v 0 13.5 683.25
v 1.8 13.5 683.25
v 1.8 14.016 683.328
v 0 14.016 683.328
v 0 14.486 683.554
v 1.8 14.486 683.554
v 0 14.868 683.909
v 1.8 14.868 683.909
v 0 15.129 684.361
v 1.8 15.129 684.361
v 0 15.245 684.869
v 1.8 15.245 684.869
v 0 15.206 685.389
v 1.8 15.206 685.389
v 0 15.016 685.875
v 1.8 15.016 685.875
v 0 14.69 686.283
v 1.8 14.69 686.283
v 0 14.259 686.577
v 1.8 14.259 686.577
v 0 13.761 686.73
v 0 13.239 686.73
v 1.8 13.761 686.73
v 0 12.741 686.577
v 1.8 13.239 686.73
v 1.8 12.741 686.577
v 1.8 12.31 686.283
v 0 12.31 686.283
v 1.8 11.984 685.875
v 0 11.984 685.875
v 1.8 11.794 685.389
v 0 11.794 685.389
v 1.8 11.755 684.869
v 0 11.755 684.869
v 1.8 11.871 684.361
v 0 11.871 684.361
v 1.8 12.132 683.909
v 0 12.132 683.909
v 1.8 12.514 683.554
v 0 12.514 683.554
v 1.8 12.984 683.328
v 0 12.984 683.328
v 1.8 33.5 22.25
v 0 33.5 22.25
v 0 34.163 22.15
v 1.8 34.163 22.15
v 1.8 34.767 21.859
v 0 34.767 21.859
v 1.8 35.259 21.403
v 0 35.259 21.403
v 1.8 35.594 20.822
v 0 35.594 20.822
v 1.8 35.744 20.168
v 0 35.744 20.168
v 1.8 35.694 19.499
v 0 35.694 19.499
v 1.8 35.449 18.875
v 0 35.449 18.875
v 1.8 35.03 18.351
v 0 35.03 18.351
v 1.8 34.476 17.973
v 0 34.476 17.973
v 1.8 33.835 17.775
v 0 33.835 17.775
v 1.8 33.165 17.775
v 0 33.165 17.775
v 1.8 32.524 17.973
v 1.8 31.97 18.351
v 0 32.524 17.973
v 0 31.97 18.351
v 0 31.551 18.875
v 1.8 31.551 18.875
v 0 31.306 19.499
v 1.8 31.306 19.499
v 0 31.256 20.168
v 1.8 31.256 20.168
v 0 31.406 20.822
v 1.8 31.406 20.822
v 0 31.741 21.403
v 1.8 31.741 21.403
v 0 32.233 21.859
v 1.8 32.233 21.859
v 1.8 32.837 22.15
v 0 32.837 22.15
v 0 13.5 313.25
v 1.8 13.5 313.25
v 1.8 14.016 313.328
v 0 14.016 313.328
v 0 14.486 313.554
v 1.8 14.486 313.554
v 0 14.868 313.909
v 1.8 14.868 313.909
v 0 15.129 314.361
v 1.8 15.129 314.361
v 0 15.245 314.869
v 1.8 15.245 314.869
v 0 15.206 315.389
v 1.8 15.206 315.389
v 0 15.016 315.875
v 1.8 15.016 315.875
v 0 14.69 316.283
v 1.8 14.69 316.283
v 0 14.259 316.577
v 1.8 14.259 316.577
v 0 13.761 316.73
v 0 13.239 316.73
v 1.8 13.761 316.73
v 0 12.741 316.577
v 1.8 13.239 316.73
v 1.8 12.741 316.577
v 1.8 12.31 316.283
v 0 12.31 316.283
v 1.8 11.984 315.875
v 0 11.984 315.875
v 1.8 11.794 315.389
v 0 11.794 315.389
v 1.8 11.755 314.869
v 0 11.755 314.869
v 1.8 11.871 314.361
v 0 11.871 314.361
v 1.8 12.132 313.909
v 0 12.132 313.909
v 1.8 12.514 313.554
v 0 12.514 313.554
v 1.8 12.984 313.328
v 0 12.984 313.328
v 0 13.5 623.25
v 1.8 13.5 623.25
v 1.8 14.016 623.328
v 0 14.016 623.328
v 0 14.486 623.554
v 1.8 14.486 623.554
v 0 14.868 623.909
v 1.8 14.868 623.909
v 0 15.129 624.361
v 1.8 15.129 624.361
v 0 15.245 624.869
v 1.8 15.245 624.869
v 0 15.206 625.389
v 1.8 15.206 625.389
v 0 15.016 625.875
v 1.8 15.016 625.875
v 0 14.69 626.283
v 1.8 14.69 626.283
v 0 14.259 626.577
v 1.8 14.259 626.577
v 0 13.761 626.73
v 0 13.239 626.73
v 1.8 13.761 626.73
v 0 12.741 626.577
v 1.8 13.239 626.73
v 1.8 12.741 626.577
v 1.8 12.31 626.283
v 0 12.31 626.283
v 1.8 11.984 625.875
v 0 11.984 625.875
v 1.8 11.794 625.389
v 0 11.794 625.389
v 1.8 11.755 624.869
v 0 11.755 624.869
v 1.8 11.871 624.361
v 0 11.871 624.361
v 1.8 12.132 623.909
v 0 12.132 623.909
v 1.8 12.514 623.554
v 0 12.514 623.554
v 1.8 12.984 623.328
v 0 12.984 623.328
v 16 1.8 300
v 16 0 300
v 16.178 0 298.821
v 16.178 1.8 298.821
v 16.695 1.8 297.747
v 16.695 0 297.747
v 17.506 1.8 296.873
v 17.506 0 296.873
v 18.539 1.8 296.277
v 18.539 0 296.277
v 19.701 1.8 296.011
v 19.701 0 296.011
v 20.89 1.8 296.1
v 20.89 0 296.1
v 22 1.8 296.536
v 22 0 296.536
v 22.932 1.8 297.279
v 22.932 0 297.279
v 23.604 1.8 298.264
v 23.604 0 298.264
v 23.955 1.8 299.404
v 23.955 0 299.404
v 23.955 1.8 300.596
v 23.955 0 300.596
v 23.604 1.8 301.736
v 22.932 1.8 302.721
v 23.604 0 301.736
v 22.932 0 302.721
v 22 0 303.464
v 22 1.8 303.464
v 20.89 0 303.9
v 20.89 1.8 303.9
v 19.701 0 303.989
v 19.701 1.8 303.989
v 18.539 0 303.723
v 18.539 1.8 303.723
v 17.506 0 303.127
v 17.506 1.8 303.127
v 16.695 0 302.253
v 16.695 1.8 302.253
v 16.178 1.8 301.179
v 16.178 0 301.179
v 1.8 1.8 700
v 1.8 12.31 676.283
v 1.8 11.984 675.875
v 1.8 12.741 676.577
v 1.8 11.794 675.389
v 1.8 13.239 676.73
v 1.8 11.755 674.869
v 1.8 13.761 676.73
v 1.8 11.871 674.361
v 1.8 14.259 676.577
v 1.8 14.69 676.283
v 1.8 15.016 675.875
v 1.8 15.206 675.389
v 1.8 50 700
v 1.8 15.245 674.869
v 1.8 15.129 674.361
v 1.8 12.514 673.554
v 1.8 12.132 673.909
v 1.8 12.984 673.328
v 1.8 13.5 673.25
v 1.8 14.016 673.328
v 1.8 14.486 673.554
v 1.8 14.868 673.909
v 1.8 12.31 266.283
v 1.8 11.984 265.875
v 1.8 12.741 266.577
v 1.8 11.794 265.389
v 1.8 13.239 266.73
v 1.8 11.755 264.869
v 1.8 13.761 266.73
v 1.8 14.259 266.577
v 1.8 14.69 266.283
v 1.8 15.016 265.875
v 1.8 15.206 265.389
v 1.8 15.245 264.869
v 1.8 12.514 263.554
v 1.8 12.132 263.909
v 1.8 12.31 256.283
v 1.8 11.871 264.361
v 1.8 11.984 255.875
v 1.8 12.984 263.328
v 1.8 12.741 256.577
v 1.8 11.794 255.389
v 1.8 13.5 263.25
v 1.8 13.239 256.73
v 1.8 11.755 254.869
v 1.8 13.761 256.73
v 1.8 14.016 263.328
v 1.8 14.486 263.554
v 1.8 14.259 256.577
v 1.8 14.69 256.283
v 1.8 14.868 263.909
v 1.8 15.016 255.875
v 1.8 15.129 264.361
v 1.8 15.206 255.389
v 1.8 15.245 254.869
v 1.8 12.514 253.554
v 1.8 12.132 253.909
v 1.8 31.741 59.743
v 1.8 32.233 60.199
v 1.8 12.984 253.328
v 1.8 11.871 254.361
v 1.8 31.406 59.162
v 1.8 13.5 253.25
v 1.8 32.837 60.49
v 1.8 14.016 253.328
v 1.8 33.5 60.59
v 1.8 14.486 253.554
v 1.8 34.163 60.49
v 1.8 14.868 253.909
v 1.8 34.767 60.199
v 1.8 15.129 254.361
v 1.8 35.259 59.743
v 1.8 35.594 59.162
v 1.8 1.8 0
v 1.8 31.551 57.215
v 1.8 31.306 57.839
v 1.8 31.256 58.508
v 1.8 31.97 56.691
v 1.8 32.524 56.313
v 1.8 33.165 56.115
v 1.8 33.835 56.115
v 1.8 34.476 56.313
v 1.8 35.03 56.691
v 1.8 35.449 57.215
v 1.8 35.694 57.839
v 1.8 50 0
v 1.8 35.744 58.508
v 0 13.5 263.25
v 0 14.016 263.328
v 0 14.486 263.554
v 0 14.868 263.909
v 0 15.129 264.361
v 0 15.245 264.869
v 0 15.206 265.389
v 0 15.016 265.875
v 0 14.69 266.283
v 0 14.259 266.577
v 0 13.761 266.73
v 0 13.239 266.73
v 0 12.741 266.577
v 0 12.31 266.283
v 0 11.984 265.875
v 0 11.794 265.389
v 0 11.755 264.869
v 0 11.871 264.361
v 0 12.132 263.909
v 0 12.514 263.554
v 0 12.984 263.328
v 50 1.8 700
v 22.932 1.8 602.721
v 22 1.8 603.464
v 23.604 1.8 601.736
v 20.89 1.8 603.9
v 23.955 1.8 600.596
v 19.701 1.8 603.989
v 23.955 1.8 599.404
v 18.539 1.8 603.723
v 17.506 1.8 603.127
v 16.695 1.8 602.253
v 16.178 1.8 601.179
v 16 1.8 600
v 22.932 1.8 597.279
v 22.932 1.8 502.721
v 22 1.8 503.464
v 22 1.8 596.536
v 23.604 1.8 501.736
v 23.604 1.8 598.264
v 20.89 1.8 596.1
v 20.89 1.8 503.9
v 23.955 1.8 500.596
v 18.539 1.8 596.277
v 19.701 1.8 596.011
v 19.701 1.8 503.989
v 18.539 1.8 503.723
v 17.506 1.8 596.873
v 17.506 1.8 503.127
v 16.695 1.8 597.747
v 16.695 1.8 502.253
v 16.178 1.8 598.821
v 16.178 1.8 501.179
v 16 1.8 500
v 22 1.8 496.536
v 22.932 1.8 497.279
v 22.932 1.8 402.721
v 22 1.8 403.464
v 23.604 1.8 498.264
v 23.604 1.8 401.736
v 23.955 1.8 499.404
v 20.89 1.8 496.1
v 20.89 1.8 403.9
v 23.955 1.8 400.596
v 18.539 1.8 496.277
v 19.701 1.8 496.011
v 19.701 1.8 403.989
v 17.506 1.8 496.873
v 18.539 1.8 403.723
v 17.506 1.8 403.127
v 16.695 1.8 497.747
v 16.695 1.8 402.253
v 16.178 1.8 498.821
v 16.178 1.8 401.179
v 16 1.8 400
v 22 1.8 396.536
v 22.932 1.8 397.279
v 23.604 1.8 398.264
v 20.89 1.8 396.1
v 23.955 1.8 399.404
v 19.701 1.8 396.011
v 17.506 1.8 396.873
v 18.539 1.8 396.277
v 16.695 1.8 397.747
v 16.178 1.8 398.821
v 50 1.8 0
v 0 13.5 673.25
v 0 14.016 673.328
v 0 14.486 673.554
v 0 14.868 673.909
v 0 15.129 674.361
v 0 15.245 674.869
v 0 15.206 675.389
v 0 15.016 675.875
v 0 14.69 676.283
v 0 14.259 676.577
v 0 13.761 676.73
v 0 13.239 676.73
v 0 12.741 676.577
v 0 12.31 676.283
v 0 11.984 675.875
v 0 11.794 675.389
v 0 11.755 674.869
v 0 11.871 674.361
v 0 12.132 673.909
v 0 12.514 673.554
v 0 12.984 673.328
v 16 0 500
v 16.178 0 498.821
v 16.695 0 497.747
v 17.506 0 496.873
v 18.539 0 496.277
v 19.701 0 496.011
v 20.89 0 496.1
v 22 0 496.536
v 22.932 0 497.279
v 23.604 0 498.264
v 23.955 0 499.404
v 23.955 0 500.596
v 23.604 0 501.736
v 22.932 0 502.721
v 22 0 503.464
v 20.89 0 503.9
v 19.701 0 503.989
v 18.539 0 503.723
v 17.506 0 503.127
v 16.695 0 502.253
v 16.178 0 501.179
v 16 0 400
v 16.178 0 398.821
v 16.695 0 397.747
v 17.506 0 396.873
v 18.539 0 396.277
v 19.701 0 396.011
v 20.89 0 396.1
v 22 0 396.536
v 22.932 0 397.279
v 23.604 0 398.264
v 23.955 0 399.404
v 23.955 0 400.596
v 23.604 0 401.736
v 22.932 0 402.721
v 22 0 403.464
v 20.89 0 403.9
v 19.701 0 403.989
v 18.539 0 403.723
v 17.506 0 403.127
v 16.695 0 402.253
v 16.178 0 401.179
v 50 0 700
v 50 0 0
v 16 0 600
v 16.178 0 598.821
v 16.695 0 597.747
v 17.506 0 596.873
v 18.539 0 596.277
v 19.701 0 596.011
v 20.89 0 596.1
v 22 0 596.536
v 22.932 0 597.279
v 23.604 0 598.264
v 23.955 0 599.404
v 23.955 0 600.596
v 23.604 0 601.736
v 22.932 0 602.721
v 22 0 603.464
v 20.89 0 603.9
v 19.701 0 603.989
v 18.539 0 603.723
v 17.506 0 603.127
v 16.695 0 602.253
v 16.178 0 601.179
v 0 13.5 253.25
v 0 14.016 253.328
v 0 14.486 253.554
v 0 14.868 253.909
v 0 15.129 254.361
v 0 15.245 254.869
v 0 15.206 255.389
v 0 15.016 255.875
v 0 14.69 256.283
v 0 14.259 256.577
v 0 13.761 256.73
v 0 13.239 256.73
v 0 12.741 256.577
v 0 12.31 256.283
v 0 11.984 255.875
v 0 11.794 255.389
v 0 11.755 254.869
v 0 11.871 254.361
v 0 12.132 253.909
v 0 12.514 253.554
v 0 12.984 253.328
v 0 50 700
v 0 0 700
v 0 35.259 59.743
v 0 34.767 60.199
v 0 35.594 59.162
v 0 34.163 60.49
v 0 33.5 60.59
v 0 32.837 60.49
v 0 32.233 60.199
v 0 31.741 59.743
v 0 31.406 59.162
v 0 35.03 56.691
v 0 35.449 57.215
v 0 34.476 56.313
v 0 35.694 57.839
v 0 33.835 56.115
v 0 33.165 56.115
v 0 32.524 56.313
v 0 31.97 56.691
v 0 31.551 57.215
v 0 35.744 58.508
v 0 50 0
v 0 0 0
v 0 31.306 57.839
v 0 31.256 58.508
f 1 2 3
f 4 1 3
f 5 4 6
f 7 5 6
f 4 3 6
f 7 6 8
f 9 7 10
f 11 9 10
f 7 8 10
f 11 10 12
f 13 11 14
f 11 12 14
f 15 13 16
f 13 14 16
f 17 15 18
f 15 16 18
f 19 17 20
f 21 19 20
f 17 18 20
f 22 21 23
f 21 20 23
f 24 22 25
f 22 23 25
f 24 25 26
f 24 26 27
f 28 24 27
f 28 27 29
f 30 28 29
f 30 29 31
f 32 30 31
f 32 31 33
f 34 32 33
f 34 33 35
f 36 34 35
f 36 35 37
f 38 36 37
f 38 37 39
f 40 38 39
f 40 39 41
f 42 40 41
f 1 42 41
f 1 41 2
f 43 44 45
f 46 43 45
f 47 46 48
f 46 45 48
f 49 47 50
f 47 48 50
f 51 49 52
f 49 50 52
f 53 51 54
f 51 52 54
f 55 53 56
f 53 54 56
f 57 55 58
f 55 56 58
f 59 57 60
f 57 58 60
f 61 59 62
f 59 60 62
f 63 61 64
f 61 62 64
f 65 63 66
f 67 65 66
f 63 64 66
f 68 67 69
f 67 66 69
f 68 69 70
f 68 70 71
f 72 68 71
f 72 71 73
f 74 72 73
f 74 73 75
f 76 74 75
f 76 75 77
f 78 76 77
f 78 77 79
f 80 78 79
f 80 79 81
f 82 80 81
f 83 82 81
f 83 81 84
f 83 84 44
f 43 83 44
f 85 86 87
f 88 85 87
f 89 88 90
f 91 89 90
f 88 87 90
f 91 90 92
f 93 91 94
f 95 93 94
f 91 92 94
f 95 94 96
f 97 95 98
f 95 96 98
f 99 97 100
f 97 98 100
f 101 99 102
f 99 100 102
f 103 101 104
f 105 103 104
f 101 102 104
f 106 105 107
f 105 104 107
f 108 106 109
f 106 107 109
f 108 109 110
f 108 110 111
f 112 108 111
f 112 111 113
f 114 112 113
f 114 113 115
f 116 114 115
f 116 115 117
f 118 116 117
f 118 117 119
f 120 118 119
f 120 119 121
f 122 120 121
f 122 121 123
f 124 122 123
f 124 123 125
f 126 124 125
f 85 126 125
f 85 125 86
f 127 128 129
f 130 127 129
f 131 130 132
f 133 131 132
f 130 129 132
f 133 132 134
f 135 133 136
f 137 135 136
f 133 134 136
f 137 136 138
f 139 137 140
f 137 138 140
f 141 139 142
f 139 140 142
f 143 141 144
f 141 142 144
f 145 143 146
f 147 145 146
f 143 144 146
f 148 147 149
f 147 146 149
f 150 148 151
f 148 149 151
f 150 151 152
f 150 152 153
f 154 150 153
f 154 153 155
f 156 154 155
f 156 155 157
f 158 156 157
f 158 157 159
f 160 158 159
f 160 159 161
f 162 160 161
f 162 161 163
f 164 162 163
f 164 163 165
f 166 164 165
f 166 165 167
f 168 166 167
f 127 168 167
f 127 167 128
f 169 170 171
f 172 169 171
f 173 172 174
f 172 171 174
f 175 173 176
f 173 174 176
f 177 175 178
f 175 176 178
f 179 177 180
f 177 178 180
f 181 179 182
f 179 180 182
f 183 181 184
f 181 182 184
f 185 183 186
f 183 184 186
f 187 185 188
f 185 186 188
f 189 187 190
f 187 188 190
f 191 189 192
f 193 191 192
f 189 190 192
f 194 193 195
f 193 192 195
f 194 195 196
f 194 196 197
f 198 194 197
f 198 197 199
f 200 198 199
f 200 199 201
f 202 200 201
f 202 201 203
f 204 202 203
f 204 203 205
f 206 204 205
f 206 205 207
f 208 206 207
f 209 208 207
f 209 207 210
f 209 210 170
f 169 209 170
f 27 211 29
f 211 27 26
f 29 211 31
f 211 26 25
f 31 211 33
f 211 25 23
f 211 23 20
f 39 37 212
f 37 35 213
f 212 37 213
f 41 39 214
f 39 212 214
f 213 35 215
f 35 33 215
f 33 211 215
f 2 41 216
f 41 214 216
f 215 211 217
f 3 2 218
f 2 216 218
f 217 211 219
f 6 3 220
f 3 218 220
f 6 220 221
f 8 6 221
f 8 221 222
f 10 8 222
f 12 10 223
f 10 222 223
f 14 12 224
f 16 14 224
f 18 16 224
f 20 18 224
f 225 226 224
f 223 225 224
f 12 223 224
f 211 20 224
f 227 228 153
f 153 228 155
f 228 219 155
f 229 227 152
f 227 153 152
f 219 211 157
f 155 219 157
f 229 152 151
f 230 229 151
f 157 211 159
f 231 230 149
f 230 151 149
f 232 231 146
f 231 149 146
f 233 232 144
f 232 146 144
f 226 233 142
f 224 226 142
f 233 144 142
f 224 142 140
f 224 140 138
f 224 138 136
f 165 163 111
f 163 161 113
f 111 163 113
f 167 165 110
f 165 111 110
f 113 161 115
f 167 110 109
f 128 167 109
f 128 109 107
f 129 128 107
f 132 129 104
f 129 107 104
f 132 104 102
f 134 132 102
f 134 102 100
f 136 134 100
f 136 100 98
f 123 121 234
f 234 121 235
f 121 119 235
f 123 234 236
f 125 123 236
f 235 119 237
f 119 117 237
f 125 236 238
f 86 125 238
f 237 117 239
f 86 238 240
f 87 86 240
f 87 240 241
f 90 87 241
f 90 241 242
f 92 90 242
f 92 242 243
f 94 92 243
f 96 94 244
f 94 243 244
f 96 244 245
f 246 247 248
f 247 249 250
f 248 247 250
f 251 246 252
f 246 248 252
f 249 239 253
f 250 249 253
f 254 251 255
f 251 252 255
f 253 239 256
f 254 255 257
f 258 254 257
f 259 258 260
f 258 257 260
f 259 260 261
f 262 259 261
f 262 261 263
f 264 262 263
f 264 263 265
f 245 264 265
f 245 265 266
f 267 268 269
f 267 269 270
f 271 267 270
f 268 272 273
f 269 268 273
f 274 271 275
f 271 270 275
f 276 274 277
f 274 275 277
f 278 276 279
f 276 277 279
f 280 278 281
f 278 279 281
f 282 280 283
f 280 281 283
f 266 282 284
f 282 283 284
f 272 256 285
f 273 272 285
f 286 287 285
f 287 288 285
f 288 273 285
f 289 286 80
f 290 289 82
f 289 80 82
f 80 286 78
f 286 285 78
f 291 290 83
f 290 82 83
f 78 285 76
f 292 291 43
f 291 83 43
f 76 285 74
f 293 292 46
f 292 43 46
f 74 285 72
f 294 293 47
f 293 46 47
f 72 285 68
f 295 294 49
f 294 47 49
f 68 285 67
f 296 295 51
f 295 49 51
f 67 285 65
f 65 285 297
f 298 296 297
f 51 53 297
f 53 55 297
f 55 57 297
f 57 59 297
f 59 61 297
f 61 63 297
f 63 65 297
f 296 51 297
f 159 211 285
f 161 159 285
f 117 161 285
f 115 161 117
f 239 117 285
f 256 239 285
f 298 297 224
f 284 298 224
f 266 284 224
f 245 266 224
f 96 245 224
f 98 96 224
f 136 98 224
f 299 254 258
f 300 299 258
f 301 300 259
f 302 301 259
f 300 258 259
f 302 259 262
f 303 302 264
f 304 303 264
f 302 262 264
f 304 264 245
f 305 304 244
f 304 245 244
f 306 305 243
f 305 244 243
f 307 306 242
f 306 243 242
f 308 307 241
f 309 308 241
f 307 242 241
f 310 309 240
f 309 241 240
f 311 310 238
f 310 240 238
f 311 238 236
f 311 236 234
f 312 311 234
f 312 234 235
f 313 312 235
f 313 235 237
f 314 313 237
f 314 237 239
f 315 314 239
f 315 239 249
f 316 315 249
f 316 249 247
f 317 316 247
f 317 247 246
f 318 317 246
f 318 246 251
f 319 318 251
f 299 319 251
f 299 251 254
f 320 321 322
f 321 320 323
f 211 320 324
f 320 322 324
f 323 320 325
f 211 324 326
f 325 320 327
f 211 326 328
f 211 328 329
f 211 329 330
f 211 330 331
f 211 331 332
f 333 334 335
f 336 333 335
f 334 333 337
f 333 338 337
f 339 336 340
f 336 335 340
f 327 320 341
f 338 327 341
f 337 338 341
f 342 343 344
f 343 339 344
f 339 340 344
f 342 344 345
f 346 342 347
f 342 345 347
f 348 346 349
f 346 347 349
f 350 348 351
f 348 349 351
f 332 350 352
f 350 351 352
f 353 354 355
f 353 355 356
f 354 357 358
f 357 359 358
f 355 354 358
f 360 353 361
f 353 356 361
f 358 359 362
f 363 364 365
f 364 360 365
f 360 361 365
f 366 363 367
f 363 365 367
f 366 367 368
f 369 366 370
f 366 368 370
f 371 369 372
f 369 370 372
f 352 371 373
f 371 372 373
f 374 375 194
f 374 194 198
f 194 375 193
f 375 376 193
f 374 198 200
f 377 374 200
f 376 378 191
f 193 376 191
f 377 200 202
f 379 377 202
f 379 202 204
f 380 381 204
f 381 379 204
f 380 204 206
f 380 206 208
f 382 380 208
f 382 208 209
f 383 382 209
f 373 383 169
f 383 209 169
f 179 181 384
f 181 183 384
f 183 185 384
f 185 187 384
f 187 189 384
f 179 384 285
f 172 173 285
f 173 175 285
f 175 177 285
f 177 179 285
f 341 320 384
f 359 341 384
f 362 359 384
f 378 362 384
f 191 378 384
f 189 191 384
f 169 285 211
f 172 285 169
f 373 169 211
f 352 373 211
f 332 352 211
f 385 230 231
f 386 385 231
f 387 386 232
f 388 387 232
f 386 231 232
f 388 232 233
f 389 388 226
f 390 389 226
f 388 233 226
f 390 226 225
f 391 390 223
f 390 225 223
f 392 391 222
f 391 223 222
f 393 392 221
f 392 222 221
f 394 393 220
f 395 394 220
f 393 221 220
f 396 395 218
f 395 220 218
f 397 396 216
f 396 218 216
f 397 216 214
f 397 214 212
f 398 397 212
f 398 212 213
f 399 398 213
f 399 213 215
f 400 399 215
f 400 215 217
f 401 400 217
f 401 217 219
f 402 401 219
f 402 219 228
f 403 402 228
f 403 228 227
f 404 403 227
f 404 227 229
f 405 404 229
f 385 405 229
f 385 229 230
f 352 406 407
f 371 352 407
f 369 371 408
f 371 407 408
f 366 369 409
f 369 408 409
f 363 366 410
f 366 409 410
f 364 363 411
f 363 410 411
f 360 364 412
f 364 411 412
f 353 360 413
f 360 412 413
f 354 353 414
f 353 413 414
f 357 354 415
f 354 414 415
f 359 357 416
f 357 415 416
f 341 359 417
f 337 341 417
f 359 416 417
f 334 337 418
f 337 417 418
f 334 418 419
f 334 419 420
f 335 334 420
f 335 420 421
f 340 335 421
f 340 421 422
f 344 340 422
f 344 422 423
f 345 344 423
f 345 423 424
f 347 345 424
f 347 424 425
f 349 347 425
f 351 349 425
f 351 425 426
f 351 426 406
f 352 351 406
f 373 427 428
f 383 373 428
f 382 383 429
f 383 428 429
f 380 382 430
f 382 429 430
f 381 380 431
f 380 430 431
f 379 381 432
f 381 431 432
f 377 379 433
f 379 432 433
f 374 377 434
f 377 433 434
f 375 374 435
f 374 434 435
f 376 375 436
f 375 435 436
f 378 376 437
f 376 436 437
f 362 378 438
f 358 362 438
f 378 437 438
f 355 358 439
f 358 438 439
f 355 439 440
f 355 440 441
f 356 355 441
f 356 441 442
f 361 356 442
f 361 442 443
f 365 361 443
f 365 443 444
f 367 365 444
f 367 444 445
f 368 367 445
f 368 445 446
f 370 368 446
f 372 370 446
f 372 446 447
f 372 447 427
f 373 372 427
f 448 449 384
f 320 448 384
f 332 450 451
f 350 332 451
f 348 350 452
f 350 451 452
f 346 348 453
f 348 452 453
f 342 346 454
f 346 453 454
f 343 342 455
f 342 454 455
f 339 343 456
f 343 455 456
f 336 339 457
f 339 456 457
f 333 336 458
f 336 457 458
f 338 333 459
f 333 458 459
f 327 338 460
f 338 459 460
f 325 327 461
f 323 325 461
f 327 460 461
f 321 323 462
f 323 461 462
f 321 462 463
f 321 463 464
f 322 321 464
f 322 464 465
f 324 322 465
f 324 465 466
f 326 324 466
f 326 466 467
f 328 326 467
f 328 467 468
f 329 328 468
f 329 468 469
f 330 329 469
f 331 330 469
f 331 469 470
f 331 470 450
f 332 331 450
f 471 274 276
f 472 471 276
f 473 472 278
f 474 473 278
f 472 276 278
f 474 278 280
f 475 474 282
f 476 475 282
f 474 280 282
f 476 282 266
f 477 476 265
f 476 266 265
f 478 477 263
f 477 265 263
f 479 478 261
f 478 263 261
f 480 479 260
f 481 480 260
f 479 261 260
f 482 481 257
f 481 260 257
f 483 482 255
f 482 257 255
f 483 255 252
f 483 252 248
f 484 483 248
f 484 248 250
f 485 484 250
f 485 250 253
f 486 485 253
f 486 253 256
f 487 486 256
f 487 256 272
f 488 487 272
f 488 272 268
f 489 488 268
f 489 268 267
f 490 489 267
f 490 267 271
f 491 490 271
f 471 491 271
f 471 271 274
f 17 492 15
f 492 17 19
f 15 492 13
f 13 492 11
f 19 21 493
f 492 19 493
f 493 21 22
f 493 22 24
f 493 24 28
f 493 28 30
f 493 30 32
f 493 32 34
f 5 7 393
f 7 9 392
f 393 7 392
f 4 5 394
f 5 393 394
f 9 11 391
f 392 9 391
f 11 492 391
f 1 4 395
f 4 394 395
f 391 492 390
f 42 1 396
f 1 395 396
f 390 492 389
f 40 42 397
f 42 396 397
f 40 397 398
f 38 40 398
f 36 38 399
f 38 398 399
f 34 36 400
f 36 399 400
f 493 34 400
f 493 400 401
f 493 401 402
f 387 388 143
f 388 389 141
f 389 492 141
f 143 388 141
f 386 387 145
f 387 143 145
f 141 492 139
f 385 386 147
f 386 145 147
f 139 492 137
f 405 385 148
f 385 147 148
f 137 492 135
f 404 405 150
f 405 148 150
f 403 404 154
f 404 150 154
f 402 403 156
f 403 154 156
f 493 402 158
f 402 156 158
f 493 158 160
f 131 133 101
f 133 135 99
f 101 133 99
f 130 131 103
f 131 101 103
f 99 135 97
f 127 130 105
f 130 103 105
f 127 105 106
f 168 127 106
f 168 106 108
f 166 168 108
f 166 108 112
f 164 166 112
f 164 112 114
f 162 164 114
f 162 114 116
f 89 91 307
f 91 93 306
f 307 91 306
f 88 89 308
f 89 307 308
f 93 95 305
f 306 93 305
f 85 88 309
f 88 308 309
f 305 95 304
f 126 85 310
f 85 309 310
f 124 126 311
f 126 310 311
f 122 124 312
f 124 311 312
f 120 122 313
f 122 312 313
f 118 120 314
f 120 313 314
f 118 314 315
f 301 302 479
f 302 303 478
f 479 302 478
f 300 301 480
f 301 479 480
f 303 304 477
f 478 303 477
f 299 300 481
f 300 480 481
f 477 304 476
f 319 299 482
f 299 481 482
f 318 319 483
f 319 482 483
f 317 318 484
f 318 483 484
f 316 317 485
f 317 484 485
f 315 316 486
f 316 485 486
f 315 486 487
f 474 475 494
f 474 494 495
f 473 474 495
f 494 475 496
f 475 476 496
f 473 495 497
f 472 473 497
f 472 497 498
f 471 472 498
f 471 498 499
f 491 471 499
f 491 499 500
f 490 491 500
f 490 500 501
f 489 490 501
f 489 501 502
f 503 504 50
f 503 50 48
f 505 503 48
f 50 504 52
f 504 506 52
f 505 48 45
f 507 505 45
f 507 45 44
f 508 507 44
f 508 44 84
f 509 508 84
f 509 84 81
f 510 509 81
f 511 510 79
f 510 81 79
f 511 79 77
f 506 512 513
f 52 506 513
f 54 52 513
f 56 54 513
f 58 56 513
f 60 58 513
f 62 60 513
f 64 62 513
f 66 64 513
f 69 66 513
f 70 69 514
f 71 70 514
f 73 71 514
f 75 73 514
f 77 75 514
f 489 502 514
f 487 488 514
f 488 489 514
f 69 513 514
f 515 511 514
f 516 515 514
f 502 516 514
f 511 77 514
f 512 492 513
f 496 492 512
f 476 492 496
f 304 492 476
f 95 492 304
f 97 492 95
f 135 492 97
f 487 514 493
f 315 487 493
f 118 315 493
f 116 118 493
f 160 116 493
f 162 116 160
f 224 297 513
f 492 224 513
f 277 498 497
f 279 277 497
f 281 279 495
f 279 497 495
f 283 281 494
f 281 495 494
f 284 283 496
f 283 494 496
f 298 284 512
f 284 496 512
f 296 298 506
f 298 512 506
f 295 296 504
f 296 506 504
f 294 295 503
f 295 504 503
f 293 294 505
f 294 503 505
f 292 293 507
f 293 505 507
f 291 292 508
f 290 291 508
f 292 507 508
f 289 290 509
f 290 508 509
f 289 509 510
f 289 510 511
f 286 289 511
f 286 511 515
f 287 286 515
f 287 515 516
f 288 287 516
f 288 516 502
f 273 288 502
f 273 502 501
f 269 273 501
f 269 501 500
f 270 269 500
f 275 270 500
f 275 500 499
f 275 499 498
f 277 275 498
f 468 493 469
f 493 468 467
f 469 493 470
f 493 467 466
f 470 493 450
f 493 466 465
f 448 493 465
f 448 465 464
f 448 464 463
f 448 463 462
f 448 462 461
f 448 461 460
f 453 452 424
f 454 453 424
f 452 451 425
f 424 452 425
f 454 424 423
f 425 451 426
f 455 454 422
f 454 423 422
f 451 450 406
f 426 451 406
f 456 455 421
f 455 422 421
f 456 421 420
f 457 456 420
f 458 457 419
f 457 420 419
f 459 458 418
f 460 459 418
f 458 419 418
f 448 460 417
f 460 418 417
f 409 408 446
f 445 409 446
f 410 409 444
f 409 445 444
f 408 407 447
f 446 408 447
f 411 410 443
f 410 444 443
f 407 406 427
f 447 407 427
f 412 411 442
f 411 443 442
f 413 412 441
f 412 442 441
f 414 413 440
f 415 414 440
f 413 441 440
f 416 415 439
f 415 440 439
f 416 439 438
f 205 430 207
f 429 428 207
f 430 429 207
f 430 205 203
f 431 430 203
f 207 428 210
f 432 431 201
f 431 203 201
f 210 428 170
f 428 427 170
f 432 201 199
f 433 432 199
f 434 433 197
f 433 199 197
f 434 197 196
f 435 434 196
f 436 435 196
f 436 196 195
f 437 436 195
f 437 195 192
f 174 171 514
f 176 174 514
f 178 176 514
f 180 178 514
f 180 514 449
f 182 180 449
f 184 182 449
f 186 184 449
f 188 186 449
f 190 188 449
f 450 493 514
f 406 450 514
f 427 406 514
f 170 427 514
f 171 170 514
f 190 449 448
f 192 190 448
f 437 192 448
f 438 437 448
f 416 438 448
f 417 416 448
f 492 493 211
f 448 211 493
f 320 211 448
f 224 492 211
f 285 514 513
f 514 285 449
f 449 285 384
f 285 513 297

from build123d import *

# Parameters (mm, degrees)
EXTRUDE_1_DEPTH             = 700
SKETCH_2_R                  = 4
CUT_EXTRUDE_1_DEPTH         = 10
SKETCH_3_R                  = 2.25
CUT_EXTRUDE_2_DEPTH         = 51
HOLE_WIZARD_3_5_3_5_1_D     = 3.5
HOLE_WIZARD_3_5_3_5_1_DEPTH = 2
HOLE_WIZARD_3_5_3_5_1_TIP   = 1.051506083


with BuildPart() as part:
    # 草圖1 → 填料-伸長1 (new body)
    with BuildSketch(Plane.XY):
        Polygon((0, 50), (0, 0), (50, 0), (50, 1.8), (1.8, 1.8), (1.8, 50), align=None)
    extrude(amount=EXTRUDE_1_DEPTH)

    # 草圖2 → 除料-伸長1 (cut)
    with BuildSketch(Plane(origin=(0, 0, 0), x_dir=(-1, 0, 0), z_dir=(0, -1, 0))):
        with Locations((-20, -300)):
            Circle(SKETCH_2_R)
        with Locations((-20, -600)):
            Circle(SKETCH_2_R)
        with Locations((-20, -500)):
            Circle(SKETCH_2_R)
        with Locations((-20, -400)):
            Circle(SKETCH_2_R)
    extrude(amount=-CUT_EXTRUDE_1_DEPTH, mode=Mode.SUBTRACT)

    # 草圖3 → 除料-伸長2 (cut, through all)
    with BuildSketch(Plane.ZY):
        with Locations((58.34, 33.5)):
            Circle(SKETCH_3_R)
        with Locations((20, 33.5)):
            Circle(SKETCH_3_R)
    extrude(amount=-CUT_EXTRUDE_2_DEPTH, mode=Mode.SUBTRACT)

    # Ø3.5 (3.5) 直徑孔1
    with Locations(Plane.ZY):
        with Locations((685, 13.5), (675, 13.5), (625, 13.5), (255, 13.5), (265, 13.5), (315, 13.5)):
            Hole(HOLE_WIZARD_3_5_3_5_1_D / 2, depth=HOLE_WIZARD_3_5_3_5_1_DEPTH)
            with Locations((0, 0, -(HOLE_WIZARD_3_5_3_5_1_DEPTH + HOLE_WIZARD_3_5_3_5_1_TIP / 2))):  # 118° drill point
                Cone(0, HOLE_WIZARD_3_5_3_5_1_D / 2, HOLE_WIZARD_3_5_3_5_1_TIP, mode=Mode.SUBTRACT)


solid = part.part
